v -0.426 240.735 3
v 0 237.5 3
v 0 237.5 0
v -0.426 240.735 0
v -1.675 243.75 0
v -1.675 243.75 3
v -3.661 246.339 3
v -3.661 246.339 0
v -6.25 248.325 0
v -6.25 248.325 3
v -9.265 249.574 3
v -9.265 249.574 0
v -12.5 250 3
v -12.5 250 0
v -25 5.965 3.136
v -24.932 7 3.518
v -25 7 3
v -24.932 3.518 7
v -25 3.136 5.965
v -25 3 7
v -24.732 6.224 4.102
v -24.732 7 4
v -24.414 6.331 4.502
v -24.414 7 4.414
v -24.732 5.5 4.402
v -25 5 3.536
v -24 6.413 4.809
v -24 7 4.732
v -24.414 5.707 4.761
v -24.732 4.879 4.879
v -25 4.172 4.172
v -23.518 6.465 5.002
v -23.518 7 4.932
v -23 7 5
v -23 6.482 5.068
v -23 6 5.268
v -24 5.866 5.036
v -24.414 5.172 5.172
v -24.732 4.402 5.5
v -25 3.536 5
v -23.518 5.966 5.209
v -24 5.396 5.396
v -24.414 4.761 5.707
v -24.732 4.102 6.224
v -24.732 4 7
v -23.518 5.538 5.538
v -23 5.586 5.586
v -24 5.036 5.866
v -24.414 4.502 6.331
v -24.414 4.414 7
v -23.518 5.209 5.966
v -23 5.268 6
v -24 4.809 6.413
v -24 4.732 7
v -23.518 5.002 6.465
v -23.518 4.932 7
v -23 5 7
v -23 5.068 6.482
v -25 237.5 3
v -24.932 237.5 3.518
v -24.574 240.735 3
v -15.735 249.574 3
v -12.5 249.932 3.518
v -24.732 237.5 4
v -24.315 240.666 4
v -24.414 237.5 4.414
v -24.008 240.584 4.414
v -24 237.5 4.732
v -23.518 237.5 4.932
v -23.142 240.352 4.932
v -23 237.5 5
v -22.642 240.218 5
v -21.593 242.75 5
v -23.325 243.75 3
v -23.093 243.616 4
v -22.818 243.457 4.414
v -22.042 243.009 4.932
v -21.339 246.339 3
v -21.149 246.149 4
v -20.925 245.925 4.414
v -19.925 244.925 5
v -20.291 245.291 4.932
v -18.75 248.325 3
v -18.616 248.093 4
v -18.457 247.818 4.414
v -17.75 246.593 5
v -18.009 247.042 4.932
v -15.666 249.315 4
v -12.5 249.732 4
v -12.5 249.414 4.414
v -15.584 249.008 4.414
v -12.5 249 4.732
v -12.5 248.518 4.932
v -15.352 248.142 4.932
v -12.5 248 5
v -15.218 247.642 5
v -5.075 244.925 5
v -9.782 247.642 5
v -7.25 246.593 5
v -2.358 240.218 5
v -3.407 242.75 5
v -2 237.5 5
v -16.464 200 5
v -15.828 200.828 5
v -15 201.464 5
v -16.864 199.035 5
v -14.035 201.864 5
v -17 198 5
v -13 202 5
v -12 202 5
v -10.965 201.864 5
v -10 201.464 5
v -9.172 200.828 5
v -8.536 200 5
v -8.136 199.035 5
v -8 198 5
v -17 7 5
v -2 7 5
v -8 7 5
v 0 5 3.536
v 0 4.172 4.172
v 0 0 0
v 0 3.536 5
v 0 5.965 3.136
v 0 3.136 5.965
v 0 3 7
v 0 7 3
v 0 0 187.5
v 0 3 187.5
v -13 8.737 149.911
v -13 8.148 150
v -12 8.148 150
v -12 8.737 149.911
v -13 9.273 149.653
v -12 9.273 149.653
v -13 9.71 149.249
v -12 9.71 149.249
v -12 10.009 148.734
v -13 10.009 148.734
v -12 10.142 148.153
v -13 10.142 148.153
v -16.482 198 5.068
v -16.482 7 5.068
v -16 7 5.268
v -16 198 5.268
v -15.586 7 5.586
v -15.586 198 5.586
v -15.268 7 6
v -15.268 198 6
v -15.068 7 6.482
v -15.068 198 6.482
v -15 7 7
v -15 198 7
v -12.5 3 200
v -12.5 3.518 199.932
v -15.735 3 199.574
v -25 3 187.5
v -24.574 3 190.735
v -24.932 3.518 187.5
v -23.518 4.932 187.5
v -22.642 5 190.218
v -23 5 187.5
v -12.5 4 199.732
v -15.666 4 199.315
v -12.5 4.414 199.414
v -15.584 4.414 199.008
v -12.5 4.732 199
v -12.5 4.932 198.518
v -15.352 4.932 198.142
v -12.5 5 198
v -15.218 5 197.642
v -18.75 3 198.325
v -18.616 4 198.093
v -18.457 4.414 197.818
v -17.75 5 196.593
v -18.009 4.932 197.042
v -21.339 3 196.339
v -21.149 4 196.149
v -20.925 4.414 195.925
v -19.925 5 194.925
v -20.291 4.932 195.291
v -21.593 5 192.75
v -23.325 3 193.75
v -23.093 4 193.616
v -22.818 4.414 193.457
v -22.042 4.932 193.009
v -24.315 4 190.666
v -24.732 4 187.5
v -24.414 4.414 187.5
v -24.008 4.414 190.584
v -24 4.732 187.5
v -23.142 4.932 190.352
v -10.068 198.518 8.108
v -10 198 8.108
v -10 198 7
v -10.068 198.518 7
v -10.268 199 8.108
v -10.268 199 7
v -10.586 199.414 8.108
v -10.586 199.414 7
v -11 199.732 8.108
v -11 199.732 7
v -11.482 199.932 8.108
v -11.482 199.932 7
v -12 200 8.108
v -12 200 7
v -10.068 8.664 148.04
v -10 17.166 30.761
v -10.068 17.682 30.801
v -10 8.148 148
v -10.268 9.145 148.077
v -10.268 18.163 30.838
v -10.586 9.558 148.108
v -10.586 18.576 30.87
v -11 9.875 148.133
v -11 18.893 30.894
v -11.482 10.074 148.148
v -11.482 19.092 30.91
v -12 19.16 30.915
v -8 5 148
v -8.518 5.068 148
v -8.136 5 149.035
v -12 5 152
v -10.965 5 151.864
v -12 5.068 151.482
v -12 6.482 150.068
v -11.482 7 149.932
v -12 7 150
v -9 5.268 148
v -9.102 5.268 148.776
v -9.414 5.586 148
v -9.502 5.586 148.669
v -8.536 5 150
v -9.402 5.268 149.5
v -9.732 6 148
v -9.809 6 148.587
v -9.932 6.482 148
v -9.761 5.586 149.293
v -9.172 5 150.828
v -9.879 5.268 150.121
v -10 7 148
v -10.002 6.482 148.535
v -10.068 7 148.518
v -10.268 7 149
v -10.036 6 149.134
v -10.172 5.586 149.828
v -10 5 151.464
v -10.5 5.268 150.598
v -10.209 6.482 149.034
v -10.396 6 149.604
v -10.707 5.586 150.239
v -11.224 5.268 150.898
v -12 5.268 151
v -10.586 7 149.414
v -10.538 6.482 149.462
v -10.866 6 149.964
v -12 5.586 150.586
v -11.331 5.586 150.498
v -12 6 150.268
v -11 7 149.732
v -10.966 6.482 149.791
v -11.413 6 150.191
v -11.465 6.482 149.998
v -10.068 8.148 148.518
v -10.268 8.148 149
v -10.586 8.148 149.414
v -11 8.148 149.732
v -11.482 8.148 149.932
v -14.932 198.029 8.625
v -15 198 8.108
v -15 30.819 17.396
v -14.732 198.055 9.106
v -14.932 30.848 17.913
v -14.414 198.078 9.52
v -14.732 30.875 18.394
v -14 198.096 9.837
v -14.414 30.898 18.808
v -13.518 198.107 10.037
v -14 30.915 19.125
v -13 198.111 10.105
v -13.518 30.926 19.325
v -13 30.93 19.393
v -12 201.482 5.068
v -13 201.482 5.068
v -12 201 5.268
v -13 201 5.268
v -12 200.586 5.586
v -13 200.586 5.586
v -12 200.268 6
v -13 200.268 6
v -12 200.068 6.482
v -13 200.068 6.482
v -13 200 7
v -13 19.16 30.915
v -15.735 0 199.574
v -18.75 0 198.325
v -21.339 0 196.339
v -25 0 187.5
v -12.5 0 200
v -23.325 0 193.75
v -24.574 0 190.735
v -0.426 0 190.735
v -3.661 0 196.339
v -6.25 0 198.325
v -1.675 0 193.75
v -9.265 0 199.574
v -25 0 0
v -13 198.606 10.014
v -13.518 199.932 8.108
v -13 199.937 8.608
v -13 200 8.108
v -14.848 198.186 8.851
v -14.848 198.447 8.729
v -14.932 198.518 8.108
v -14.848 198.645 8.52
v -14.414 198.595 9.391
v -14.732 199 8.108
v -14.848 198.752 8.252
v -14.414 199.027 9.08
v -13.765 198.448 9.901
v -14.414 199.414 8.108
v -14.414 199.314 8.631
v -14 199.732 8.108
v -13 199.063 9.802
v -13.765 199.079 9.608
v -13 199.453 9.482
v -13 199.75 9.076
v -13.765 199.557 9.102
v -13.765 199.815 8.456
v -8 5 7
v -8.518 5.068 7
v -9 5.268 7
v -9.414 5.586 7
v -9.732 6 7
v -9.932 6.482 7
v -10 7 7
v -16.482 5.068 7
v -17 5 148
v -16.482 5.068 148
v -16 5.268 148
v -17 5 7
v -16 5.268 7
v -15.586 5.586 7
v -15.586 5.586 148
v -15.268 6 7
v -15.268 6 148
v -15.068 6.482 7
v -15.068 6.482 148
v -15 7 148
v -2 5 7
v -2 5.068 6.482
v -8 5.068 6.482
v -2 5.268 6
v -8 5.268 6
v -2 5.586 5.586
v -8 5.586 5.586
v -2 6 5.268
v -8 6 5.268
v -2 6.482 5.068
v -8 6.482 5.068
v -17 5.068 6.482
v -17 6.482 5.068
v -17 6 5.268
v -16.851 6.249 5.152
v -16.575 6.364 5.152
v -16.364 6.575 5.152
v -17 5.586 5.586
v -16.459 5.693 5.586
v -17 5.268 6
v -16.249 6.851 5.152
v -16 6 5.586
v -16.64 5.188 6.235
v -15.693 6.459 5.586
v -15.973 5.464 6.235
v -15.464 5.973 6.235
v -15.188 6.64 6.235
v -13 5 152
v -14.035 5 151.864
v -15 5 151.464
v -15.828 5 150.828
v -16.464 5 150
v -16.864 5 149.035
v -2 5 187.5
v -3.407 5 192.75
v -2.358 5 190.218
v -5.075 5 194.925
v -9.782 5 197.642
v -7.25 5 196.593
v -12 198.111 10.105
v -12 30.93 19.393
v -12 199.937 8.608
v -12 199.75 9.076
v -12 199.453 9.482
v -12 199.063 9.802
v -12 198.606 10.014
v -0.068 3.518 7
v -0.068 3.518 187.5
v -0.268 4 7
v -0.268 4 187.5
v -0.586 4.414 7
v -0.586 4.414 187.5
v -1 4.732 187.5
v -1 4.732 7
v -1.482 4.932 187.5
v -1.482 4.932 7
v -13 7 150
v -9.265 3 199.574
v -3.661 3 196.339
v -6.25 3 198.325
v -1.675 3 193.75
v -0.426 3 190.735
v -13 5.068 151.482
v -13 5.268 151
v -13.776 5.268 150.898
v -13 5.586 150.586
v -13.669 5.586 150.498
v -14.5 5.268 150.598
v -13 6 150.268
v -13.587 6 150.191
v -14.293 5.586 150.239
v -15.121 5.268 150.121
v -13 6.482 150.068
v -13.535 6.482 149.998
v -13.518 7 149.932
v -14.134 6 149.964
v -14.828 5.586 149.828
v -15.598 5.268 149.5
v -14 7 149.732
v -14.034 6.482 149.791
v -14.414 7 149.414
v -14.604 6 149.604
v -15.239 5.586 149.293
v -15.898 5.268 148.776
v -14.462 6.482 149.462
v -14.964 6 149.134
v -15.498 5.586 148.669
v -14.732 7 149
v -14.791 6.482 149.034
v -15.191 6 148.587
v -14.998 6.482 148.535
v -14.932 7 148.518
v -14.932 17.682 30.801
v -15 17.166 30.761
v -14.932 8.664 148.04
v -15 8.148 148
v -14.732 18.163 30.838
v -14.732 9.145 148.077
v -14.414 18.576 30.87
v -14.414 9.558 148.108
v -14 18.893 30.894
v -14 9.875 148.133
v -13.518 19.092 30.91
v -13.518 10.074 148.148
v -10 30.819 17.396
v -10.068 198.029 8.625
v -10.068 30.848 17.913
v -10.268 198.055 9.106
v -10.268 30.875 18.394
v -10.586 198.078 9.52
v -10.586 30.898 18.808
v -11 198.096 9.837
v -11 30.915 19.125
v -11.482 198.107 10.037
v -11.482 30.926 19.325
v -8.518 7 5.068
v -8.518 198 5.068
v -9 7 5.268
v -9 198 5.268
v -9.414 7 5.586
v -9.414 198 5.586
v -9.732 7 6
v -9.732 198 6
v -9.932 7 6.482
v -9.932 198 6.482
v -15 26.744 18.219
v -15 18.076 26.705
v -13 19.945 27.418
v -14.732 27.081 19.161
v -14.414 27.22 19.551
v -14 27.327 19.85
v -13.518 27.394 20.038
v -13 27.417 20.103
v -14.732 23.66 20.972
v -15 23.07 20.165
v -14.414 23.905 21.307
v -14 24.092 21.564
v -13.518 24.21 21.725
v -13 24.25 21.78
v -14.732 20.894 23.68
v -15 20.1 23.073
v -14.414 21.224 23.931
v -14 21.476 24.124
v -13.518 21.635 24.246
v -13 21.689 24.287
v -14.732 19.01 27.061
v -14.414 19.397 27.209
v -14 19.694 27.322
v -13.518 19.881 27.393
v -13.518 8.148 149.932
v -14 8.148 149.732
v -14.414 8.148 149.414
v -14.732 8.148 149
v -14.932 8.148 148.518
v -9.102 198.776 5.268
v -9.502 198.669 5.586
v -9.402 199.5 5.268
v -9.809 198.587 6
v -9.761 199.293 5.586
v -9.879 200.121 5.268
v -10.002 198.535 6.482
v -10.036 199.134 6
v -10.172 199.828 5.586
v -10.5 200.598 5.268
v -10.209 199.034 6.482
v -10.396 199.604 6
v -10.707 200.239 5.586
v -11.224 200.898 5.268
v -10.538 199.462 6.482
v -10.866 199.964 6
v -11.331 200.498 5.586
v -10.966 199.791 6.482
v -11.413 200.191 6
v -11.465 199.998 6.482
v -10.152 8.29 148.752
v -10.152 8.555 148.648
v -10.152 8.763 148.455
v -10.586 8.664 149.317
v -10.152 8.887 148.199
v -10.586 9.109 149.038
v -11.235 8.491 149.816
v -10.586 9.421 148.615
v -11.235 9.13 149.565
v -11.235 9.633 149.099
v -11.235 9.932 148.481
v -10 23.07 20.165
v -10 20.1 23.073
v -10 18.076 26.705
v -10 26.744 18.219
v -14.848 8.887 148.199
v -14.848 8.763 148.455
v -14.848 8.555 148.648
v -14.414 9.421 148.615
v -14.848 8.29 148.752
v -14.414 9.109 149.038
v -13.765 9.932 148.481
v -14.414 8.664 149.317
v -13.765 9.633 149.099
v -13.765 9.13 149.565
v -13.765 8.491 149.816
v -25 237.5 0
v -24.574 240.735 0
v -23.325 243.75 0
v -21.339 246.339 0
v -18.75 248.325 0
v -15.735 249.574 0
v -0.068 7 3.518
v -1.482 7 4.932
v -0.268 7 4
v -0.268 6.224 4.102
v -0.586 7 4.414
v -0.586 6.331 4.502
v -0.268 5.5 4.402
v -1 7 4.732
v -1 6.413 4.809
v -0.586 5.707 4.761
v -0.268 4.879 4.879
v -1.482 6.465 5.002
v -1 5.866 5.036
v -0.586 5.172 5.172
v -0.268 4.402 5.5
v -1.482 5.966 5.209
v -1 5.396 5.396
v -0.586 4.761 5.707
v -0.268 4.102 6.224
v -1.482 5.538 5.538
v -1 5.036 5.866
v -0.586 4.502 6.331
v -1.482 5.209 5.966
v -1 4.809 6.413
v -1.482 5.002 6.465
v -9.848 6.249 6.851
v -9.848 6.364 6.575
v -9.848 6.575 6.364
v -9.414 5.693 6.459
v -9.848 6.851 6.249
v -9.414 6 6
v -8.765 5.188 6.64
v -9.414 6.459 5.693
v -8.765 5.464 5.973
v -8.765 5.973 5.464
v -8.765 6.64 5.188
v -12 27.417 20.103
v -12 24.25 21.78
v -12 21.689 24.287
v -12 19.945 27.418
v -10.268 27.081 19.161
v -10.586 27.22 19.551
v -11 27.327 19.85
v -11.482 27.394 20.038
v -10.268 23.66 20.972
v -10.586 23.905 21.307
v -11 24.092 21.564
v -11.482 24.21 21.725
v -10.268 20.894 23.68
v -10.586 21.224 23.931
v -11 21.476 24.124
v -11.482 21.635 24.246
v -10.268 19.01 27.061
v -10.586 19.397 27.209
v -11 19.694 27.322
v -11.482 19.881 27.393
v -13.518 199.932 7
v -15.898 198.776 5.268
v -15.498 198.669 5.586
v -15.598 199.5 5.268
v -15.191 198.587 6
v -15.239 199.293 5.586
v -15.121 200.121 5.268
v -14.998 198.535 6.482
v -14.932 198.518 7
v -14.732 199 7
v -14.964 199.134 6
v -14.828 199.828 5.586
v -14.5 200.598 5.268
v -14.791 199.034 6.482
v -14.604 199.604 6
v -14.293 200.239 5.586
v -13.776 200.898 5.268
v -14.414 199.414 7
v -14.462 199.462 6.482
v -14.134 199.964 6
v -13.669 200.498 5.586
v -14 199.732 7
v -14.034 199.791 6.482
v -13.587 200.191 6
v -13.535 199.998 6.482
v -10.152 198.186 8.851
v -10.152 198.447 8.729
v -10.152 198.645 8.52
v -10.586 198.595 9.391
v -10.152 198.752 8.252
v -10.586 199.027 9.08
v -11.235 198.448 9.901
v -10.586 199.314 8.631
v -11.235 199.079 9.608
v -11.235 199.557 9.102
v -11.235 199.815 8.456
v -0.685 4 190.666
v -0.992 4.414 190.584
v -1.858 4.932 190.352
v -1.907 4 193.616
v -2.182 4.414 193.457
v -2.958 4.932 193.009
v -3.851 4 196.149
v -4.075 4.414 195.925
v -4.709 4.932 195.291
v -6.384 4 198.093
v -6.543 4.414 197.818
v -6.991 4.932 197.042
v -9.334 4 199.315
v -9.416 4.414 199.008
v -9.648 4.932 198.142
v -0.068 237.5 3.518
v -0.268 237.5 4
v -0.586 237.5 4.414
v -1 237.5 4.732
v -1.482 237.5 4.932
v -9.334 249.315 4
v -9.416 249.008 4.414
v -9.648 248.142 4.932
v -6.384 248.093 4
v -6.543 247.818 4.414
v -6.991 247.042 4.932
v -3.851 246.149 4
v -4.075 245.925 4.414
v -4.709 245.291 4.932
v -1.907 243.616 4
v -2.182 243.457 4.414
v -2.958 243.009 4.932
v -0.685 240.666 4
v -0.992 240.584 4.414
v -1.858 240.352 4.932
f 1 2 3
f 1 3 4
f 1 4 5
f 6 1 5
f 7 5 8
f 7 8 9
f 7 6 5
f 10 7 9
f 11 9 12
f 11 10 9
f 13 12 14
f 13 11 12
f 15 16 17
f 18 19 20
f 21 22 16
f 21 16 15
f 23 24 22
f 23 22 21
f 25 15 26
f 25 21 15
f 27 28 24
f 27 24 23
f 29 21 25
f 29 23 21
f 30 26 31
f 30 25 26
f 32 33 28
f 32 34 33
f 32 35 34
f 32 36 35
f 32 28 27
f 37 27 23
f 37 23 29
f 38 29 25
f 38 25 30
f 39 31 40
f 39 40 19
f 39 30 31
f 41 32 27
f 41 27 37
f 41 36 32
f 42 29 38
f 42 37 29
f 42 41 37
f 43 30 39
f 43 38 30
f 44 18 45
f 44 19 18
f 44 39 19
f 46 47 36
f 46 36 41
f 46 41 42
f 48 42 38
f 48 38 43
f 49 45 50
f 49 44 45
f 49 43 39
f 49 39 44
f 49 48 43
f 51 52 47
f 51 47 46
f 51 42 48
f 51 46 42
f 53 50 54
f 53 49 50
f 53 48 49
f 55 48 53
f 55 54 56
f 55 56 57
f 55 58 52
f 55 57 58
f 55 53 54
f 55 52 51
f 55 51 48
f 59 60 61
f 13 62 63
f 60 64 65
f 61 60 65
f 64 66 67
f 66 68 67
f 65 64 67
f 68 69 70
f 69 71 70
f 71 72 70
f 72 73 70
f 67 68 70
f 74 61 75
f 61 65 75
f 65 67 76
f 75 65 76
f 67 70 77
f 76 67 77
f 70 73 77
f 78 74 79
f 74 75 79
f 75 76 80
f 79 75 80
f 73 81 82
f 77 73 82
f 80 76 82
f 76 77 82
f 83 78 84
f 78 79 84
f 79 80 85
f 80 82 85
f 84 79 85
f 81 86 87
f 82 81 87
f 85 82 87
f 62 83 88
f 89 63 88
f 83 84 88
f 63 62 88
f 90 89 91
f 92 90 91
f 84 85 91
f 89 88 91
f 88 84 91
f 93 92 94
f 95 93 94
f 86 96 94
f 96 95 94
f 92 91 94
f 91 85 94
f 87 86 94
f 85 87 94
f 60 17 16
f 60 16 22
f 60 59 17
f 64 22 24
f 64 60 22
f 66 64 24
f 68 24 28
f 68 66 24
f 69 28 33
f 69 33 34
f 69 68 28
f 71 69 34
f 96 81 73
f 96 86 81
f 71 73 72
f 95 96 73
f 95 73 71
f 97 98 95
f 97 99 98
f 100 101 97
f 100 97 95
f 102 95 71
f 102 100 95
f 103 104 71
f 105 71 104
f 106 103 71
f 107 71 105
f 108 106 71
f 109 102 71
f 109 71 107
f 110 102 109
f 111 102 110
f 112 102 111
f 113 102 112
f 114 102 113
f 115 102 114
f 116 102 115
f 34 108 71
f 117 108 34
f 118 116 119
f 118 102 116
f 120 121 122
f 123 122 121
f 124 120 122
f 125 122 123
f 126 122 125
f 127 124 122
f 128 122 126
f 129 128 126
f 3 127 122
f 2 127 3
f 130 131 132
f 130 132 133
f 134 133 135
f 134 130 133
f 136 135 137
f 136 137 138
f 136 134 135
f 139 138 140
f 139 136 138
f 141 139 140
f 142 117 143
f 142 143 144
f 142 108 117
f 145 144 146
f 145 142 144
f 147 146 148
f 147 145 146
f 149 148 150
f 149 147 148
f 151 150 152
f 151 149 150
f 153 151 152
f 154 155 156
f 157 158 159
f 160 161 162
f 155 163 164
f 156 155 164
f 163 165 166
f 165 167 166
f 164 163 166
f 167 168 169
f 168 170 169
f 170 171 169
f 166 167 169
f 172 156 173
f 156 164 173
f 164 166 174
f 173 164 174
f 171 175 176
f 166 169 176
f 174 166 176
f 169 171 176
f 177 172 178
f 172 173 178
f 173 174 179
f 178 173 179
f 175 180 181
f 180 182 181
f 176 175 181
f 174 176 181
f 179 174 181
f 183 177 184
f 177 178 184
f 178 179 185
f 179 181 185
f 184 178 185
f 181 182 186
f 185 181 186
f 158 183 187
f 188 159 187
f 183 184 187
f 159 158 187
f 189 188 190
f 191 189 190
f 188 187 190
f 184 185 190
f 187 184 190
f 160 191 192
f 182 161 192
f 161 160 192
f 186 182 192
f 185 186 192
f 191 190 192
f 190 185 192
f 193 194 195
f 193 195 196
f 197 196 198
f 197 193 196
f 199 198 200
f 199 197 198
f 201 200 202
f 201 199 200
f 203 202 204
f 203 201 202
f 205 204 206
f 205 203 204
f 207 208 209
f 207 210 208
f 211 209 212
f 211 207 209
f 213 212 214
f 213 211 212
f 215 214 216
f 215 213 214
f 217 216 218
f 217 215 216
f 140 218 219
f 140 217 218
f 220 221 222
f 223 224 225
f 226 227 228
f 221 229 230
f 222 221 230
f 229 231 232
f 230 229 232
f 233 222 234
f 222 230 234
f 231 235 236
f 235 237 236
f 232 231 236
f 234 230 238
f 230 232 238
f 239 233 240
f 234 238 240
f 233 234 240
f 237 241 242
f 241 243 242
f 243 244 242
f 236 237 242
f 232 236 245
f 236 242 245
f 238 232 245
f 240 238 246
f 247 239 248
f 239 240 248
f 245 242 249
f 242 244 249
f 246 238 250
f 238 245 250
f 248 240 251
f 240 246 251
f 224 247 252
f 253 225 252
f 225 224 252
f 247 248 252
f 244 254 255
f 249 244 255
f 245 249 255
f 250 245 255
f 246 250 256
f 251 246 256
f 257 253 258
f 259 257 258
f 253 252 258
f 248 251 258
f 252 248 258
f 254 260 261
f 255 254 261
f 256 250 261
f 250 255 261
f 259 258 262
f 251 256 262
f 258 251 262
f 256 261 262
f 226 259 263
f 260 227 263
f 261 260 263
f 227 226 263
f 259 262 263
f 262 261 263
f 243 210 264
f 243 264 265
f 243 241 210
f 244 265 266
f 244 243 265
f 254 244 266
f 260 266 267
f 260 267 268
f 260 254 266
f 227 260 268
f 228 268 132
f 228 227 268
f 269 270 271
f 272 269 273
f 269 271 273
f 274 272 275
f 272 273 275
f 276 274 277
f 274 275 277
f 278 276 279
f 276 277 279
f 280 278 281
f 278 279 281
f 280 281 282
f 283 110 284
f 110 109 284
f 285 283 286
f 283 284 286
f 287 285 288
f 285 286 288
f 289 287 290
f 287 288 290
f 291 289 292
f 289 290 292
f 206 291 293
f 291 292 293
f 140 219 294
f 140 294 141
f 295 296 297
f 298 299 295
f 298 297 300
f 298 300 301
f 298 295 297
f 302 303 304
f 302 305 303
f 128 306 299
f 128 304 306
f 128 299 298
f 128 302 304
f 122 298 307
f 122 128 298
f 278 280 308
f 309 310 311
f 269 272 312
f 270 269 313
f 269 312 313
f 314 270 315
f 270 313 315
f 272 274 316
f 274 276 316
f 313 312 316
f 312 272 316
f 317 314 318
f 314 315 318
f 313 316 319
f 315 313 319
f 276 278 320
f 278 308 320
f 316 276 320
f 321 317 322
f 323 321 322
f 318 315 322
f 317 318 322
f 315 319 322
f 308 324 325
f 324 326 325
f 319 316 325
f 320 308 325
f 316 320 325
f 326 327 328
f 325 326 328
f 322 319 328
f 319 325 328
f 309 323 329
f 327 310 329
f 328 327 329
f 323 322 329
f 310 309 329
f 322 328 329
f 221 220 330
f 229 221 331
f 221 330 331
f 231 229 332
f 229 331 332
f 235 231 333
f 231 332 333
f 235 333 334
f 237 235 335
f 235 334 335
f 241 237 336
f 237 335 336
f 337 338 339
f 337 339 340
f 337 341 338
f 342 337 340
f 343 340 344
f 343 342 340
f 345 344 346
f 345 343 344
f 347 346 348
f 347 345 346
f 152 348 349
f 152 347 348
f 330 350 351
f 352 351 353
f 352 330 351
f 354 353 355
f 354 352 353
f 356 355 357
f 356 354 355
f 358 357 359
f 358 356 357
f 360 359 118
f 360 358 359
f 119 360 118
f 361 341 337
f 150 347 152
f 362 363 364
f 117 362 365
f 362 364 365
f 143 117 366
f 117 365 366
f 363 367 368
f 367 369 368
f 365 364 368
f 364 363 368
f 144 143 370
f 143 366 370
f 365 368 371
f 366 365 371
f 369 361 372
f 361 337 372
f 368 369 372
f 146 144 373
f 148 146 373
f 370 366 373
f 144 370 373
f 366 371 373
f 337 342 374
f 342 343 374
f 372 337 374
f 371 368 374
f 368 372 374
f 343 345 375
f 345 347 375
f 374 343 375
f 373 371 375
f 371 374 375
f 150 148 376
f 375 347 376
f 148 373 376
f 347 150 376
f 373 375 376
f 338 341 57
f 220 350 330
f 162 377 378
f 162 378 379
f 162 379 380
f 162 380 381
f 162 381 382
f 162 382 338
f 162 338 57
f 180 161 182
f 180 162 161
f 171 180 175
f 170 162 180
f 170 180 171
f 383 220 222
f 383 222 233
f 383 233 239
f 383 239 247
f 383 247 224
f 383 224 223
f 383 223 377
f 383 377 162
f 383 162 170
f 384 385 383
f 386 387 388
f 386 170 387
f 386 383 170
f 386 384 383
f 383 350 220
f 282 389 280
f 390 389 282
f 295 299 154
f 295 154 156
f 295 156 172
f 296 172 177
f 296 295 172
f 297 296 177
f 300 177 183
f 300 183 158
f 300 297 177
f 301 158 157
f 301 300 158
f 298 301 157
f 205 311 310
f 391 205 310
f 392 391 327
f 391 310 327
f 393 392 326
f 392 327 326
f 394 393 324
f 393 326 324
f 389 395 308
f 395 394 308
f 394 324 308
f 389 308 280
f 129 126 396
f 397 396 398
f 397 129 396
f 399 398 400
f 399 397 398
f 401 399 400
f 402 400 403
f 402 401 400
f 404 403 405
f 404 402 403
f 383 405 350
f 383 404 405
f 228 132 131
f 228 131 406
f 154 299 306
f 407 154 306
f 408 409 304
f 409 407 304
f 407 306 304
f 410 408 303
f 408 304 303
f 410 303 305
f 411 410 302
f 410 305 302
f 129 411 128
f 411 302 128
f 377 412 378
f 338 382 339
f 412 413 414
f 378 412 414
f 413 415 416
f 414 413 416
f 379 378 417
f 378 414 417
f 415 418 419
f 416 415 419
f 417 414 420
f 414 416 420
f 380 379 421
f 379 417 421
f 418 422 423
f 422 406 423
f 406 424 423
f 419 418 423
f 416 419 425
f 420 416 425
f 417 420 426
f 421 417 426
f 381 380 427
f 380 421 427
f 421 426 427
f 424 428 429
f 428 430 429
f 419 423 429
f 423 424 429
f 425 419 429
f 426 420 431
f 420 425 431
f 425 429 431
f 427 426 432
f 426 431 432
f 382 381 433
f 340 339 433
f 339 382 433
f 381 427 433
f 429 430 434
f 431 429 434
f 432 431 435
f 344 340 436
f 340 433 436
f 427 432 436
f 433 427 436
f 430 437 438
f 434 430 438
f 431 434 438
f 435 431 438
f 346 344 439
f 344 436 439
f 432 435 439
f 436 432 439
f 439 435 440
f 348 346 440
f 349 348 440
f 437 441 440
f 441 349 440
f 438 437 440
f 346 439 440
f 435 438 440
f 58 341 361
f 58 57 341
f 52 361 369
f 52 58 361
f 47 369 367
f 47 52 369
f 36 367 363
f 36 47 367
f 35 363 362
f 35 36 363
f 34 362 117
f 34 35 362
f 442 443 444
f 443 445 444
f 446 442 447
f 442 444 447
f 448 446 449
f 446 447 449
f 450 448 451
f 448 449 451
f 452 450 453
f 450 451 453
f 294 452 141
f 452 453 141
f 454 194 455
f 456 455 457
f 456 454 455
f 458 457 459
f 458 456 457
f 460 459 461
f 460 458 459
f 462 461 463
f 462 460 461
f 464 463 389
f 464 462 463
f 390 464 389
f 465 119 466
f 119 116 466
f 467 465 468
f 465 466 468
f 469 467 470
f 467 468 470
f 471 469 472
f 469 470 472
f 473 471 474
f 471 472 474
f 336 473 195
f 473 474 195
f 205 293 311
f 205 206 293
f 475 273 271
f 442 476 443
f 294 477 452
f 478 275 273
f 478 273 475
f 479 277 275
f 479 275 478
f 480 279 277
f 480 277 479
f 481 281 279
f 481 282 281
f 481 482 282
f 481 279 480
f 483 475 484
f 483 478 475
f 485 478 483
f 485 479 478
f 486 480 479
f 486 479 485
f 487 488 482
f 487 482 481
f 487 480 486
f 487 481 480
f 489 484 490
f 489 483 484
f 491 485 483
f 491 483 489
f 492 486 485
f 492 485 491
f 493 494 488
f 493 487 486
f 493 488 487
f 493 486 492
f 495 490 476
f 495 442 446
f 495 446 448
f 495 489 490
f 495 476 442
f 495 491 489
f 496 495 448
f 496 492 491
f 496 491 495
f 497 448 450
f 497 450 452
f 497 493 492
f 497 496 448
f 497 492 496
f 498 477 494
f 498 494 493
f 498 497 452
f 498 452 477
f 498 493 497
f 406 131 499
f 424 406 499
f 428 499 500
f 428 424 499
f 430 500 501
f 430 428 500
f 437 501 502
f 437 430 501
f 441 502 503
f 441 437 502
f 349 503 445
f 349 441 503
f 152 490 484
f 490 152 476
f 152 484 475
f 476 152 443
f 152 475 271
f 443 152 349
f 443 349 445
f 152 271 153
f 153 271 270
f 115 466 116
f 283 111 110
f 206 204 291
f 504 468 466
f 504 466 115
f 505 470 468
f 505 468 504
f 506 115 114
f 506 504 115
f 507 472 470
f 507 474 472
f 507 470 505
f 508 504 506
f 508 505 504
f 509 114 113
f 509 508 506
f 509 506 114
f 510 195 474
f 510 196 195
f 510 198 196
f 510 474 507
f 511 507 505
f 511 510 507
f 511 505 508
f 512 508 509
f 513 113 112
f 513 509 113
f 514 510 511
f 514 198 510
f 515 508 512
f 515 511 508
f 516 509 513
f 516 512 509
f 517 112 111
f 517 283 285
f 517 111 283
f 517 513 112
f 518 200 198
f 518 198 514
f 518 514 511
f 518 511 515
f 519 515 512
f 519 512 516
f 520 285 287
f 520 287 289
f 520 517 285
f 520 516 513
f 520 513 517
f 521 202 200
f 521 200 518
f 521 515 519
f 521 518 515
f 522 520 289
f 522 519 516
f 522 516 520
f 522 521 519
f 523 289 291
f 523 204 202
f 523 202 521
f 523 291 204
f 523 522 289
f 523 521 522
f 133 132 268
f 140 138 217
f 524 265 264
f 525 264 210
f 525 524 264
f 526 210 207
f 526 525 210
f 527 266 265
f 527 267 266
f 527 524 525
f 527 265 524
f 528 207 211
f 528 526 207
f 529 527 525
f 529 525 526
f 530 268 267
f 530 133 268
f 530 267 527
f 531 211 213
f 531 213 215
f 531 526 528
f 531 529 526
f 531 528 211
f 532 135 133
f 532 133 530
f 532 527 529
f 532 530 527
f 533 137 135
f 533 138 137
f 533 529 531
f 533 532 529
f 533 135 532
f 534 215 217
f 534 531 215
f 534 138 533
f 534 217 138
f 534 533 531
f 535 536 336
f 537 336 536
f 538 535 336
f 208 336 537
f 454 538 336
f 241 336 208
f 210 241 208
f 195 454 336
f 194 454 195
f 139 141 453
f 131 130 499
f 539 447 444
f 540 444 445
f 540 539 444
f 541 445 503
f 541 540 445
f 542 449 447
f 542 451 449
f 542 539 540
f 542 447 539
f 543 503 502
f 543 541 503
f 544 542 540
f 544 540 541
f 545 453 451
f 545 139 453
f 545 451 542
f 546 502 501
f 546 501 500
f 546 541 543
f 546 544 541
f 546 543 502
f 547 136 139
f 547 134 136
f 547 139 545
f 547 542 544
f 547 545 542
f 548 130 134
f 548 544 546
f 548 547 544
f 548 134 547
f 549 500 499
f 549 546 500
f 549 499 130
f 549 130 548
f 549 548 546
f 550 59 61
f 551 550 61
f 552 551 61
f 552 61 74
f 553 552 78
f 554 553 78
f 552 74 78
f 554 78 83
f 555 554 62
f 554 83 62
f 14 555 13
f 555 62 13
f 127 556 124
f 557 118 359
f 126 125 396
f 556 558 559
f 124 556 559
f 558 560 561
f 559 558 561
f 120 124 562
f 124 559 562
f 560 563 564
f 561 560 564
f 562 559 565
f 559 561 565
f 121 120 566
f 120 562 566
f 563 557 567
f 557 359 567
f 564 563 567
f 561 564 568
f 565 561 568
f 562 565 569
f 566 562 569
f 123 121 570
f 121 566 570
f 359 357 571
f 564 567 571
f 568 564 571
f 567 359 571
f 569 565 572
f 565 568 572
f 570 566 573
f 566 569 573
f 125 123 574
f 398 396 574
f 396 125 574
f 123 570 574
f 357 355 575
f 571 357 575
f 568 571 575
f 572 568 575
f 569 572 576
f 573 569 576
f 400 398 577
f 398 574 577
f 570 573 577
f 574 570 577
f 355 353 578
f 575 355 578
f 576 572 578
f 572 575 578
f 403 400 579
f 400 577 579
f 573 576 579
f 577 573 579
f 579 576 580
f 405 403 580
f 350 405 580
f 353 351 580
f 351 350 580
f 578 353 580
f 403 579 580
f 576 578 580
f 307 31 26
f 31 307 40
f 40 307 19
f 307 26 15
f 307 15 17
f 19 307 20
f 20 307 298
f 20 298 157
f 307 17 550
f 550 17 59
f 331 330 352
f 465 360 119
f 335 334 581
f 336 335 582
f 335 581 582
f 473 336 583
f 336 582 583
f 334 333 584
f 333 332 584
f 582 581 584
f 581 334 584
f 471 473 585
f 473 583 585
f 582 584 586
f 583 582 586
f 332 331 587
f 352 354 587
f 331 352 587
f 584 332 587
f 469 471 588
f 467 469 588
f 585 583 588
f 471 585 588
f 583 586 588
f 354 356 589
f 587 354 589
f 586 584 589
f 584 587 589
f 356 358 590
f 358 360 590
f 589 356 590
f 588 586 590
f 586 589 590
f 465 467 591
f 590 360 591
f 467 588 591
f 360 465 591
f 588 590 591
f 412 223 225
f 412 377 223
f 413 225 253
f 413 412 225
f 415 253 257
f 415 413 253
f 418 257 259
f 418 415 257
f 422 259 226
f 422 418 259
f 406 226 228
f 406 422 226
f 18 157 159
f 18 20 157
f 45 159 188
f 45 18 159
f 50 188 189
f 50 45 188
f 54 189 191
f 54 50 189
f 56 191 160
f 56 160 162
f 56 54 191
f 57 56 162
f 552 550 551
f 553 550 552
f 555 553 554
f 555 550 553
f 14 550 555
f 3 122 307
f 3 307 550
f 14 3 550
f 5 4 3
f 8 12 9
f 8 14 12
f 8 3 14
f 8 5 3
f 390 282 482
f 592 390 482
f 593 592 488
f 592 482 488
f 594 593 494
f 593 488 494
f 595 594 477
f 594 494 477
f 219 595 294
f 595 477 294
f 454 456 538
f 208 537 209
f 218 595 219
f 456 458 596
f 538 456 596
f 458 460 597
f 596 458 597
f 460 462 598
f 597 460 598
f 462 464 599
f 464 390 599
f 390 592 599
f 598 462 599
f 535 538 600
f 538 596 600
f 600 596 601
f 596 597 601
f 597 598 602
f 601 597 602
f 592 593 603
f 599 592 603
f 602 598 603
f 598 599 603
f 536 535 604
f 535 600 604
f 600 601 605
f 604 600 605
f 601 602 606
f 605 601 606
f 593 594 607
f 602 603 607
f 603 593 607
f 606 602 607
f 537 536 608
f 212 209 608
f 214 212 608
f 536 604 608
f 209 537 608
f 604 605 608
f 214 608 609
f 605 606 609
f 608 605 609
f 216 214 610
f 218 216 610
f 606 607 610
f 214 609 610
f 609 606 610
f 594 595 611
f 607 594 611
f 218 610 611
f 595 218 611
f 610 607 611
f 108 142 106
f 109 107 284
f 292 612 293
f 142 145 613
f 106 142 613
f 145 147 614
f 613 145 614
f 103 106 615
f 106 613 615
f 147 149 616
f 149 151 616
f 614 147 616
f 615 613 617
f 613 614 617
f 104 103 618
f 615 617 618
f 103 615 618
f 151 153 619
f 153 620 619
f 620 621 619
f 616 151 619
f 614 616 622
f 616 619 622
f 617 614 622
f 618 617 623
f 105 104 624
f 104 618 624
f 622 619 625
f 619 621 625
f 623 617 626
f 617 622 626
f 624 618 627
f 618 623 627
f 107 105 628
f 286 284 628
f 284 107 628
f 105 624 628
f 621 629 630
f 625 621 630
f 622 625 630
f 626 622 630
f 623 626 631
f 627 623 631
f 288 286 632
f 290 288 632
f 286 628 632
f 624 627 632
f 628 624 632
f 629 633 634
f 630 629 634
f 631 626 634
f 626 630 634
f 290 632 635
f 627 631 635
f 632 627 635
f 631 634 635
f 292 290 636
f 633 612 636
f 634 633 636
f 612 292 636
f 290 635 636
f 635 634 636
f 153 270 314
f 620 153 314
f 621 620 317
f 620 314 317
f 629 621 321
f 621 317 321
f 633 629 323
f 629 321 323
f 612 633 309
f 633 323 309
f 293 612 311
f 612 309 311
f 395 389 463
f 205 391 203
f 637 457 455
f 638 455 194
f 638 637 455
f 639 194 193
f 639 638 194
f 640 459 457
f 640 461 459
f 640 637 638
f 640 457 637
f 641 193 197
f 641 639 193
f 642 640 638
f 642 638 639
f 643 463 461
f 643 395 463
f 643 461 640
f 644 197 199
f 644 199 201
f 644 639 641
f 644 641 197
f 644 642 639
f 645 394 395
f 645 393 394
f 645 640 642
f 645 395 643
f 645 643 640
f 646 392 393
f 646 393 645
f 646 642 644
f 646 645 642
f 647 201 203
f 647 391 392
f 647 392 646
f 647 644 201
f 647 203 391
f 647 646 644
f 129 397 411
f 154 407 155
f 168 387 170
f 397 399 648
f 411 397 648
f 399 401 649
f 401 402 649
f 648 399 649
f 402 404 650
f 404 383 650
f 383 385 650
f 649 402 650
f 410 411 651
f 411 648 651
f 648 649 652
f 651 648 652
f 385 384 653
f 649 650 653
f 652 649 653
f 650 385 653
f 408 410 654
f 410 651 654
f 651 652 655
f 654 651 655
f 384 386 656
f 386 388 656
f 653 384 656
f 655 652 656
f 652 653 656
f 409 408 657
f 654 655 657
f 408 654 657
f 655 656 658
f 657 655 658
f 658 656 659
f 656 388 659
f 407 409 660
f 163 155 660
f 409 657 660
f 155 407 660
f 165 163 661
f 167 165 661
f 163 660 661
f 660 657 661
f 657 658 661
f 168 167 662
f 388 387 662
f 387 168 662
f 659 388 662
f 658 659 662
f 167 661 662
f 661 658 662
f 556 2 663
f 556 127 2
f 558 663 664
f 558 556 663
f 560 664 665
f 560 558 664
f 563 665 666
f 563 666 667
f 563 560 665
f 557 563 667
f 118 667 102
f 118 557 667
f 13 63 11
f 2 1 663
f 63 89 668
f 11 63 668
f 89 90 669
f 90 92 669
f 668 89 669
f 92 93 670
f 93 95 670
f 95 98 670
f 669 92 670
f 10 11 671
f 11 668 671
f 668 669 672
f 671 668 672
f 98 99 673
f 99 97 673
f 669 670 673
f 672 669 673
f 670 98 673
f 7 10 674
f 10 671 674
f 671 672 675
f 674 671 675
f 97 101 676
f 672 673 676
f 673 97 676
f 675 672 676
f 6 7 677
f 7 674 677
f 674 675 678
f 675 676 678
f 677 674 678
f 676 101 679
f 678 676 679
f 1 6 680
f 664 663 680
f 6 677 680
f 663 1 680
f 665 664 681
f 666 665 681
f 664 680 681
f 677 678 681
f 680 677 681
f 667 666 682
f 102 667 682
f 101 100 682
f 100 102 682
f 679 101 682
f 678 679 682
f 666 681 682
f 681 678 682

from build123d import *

# Parameters (mm, degrees)
F1_DEPTH = 25
F4_DEPTH = 5
F5_R     = 12.49999
F6_R     = 2


# Not quite as in the source:
# - a fillet or chamfer is up to 0.001 mm smaller than in the source, because OpenCascade refuses the exact size


with BuildPart() as f1:
    # F0 (on Right) → F1 (new body)
    with BuildSketch(Plane.YZ):
        Polygon((0, 200), (0, 0), (250, 0), (250, 5), (5, 5), (5, 200), align=None)
    extrude(amount=-F1_DEPTH)

    # F3 (on offset) → F4 (join)
    with BuildSketch(Plane.YZ.offset(-10)):
        Polygon((10, 150), (5, 150), (5, 5), (200, 5), (200, 10), (20, 20), align=None)
    extrude(amount=-F4_DEPTH)

    # F5 (radius 12.5 in the source; OpenCascade refuses exactly that, so slightly less here)
    f5_edges = [f1.edges().sort_by_distance(p)[0] for p in [
        (0, 2.5, 200),
        (-25, 2.5, 200),
        (-25, 250, 2.5),
        (0, 250, 2.5),
        (-12.5, 20, 20),
    ]]
    fillet(f5_edges, radius=F5_R)

    # F6
    f6_edges = [f1.edges().sort_by_distance(p)[0] for p in [
        (0, 5, 96.250005),
        (-3.661162, 5, 196.338838),
        (-5, 5, 5),
        (-12.5, 5, 200),
        (-10, 5, 77.5),
        (-21.338838, 5, 196.338838),
        (-12.5, 5, 150),
        (-25, 5, 96.250005),
        (-15, 5, 77.5),
        (-20, 5, 5),
        (-10, 14.5802, 90.457403),
        (-12.5, 19.1604, 30.914806),
        (-12.5, 10, 150),
        (-15, 14.5802, 90.457403),
        (-15, 115.465098, 14.696383),
        (-15, 22.879257, 22.94117),
        (-15, 200, 7.5),
        (-15, 102.5, 5),
        (-15, 7.5, 150),
        (-10, 115.465098, 14.696383),
        (-10, 22.879257, 22.94117),
        (-10, 200, 7.5),
        (-10, 102.5, 5),
        (-10, 7.5, 150),
        (0, 121.250005, 5),
        (-3.661162, 246.338838, 5),
        (-12.5, 250, 5),
        (-21.338838, 246.338838, 5),
        (-12.5, 200, 5),
        (-25, 121.250005, 5),
        (-12.5, 200, 10),
    ]]
    fillet(f6_edges, radius=F6_R)


solid = f1.part
